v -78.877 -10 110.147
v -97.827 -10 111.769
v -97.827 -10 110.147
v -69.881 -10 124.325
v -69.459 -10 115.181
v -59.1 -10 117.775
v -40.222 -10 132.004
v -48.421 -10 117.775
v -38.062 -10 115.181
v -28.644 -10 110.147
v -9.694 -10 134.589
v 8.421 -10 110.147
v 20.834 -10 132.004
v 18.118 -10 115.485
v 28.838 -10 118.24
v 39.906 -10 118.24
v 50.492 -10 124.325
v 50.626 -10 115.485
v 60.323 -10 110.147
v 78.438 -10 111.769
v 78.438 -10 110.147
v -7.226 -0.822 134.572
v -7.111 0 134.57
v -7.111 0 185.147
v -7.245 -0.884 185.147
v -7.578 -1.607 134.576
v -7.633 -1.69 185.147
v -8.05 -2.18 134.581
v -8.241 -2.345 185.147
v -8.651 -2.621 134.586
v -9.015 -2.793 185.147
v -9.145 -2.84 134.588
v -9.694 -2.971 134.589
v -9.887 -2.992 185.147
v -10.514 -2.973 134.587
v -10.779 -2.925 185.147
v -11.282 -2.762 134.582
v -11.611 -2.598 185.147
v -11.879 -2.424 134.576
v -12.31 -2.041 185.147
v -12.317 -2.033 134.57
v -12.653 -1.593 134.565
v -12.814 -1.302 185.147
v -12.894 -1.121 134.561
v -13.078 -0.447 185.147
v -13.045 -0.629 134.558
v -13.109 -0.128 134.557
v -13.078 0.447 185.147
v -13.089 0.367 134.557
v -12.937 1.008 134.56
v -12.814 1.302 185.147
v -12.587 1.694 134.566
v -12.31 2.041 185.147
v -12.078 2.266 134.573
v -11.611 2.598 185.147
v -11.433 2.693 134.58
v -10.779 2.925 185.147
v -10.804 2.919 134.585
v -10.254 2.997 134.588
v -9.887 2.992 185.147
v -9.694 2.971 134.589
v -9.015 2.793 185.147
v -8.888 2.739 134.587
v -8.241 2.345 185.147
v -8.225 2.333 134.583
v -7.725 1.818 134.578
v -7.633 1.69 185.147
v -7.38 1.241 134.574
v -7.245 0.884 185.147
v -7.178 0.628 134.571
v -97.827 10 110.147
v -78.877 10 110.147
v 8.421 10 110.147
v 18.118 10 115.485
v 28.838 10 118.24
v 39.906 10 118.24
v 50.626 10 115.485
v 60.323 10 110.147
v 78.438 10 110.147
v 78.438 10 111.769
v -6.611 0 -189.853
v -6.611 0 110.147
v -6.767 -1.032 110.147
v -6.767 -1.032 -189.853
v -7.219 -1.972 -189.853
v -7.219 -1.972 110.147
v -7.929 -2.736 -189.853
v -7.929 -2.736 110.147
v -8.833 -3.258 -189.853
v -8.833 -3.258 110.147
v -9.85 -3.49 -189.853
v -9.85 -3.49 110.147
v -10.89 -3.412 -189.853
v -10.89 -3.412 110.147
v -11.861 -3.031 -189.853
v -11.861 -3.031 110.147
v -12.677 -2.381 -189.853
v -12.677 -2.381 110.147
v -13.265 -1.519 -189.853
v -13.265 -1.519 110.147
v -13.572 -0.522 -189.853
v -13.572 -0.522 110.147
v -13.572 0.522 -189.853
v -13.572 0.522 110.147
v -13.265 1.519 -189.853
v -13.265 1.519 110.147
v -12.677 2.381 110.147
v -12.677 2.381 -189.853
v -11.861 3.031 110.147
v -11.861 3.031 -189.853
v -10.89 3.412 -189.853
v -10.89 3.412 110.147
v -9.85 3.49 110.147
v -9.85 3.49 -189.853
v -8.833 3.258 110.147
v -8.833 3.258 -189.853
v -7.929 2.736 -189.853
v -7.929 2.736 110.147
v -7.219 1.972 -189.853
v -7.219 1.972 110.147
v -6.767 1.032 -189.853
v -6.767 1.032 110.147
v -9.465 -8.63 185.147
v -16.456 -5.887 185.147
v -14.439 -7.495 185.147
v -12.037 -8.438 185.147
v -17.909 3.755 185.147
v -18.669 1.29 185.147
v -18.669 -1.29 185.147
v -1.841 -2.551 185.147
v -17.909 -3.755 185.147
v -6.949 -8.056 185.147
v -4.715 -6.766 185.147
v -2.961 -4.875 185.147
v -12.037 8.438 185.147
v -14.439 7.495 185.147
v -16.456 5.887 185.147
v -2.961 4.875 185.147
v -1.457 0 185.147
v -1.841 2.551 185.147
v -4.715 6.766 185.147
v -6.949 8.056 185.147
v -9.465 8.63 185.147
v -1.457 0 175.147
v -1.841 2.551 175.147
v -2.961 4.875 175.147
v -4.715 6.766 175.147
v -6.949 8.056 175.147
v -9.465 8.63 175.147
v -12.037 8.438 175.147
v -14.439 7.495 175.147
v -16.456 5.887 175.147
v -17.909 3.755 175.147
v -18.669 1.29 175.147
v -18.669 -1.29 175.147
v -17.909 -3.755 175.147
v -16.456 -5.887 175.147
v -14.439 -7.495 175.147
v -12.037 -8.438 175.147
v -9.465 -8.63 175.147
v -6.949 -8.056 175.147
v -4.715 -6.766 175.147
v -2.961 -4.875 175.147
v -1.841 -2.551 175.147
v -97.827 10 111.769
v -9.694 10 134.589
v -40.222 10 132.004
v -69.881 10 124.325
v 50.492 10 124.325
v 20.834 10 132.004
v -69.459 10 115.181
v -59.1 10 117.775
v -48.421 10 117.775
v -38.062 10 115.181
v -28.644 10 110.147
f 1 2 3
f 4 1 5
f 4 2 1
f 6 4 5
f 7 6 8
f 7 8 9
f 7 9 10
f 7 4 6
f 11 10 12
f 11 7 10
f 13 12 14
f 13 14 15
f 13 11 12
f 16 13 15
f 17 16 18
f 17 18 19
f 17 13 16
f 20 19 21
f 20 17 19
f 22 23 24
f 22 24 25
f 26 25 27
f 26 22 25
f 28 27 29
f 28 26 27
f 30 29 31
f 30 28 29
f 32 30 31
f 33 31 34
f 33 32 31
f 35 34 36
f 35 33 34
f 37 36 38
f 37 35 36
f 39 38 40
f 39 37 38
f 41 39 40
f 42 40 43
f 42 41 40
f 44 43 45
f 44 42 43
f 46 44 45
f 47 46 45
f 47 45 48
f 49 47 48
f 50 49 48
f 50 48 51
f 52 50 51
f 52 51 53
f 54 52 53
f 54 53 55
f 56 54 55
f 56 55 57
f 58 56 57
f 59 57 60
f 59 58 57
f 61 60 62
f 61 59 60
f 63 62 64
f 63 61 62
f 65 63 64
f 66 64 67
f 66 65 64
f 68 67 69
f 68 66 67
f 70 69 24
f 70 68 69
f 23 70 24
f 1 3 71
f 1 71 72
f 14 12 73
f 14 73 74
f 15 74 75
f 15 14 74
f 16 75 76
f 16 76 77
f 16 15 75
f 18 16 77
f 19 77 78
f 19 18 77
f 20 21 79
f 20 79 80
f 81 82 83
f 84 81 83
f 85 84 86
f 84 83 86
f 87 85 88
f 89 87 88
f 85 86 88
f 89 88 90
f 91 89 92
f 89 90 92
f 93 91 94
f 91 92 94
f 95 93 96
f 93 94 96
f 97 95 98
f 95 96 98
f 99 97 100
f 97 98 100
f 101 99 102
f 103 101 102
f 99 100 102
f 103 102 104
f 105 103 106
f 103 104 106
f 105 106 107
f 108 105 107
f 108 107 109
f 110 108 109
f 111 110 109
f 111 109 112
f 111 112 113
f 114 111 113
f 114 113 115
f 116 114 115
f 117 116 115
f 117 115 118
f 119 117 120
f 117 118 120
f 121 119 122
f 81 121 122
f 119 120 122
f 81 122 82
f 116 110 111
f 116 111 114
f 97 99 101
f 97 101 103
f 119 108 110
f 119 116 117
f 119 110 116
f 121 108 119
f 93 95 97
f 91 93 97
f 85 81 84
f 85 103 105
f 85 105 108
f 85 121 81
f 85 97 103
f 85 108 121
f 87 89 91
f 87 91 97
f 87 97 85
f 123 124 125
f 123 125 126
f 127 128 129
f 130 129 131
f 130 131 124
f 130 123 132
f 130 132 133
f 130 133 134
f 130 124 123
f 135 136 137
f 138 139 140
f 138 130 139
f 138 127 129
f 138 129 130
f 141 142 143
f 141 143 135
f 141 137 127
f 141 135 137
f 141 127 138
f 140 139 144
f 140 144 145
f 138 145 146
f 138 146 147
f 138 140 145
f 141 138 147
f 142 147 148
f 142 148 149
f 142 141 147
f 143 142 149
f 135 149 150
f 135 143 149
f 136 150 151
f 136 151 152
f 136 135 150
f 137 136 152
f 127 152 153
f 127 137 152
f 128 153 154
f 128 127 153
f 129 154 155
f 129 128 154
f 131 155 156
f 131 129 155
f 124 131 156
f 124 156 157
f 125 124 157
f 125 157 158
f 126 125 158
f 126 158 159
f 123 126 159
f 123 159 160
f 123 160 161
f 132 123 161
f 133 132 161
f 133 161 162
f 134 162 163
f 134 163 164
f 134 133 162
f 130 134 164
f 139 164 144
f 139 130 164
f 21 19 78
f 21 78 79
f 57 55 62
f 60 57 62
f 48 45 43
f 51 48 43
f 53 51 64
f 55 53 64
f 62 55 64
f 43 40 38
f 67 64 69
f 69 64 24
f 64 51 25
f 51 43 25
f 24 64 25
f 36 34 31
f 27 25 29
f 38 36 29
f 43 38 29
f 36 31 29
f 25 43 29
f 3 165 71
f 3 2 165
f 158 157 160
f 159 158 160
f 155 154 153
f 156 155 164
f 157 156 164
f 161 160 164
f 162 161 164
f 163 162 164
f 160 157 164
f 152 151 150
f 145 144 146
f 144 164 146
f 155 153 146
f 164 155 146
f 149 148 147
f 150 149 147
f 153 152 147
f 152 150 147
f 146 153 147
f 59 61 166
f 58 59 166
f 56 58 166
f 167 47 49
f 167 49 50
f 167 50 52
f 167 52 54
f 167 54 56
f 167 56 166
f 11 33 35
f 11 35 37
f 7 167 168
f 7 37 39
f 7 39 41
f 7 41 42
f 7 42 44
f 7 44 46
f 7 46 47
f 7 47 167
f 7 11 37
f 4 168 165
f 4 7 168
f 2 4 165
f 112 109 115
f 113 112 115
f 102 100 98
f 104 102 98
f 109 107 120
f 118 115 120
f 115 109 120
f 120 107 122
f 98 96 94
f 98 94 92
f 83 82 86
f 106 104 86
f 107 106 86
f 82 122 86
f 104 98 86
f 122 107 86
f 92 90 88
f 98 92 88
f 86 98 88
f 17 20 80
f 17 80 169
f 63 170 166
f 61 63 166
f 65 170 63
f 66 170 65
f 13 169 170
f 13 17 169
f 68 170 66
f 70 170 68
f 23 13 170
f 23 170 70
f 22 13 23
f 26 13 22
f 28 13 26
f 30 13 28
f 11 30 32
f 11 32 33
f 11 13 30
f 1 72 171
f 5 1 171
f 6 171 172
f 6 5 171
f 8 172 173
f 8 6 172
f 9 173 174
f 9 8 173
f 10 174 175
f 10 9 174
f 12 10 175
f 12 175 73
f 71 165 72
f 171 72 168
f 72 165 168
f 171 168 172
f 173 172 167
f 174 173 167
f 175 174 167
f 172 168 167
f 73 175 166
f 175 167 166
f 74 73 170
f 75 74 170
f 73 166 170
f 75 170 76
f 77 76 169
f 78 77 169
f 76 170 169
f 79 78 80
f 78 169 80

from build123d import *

# Parameters (mm, degrees)
F1_DEPTH = 10
F2_R     = 3
F3_DEPTH = 75
F4_R     = 3.5
F5_DEPTH = 300
F6_R     = 8.654538
F7_DEPTH = 10


with BuildPart() as f1:
    # F0 (on Front) → F1 (new body, symmetric)
    with BuildSketch(Plane.XZ):
        with BuildLine():
            Line((-97.826793, 111.769112), (-97.826793, 110.147078))
            Line((-97.826793, 110.147078), (-78.877119, 110.147078))
            ThreePointArc((-78.877119, 110.147078), (-53.760529, 118.103222), (-28.64394, 110.147078))
            Line((-28.64394, 110.147078), (-9.694265, 110.147078))
            Line((-9.694265, 110.147078), (-9.694265, 134.588813))
            ThreePointArc((-9.694265, 134.588813), (-55.213715, 128.791347), (-97.826793, 111.769112))
        make_face()
        with BuildLine():
            ThreePointArc((78.438263, 111.769112), (35.825185, 128.791347), (-9.694265, 134.588813))
            Line((-9.694265, 134.588813), (-9.694265, 110.147078))
            Line((-9.694265, 110.147078), (8.421366, 110.147078))
            ThreePointArc((8.421366, 110.147078), (34.371999, 118.588705), (60.322631, 110.147078))
            Line((60.322631, 110.147078), (78.438263, 110.147078))
            Line((78.438263, 110.147078), (78.438263, 111.769112))
        make_face()
    extrude(amount=F1_DEPTH, both=True)

    # F2 (on face) → F3 (join)
    with BuildSketch(Plane(origin=(0, 0, 110.147078), x_dir=(1, 0, 0), z_dir=(0, 0, -1))):
        with Locations((-10.111287, 0)):
            Circle(F2_R)
    extrude(amount=-F3_DEPTH)


with BuildPart() as f5:
    # F4 (on face) → F5 (new body)
    with BuildSketch(Plane(origin=(0, 0, 110.147078), x_dir=(1, 0, 0), z_dir=(0, 0, -1))):
        with Locations((-10.111287, 0)):
            Circle(F4_R)
    extrude(amount=F5_DEPTH)


with BuildPart() as f7:
    # F6 (on face) → F7 (new body)
    with BuildSketch(Plane.XY.offset(185.147078)):
        with Locations((-10.111287, 0)):
            Circle(F6_R)
    extrude(amount=-F7_DEPTH)


solid = Compound([f1.part, f5.part, f7.part])
